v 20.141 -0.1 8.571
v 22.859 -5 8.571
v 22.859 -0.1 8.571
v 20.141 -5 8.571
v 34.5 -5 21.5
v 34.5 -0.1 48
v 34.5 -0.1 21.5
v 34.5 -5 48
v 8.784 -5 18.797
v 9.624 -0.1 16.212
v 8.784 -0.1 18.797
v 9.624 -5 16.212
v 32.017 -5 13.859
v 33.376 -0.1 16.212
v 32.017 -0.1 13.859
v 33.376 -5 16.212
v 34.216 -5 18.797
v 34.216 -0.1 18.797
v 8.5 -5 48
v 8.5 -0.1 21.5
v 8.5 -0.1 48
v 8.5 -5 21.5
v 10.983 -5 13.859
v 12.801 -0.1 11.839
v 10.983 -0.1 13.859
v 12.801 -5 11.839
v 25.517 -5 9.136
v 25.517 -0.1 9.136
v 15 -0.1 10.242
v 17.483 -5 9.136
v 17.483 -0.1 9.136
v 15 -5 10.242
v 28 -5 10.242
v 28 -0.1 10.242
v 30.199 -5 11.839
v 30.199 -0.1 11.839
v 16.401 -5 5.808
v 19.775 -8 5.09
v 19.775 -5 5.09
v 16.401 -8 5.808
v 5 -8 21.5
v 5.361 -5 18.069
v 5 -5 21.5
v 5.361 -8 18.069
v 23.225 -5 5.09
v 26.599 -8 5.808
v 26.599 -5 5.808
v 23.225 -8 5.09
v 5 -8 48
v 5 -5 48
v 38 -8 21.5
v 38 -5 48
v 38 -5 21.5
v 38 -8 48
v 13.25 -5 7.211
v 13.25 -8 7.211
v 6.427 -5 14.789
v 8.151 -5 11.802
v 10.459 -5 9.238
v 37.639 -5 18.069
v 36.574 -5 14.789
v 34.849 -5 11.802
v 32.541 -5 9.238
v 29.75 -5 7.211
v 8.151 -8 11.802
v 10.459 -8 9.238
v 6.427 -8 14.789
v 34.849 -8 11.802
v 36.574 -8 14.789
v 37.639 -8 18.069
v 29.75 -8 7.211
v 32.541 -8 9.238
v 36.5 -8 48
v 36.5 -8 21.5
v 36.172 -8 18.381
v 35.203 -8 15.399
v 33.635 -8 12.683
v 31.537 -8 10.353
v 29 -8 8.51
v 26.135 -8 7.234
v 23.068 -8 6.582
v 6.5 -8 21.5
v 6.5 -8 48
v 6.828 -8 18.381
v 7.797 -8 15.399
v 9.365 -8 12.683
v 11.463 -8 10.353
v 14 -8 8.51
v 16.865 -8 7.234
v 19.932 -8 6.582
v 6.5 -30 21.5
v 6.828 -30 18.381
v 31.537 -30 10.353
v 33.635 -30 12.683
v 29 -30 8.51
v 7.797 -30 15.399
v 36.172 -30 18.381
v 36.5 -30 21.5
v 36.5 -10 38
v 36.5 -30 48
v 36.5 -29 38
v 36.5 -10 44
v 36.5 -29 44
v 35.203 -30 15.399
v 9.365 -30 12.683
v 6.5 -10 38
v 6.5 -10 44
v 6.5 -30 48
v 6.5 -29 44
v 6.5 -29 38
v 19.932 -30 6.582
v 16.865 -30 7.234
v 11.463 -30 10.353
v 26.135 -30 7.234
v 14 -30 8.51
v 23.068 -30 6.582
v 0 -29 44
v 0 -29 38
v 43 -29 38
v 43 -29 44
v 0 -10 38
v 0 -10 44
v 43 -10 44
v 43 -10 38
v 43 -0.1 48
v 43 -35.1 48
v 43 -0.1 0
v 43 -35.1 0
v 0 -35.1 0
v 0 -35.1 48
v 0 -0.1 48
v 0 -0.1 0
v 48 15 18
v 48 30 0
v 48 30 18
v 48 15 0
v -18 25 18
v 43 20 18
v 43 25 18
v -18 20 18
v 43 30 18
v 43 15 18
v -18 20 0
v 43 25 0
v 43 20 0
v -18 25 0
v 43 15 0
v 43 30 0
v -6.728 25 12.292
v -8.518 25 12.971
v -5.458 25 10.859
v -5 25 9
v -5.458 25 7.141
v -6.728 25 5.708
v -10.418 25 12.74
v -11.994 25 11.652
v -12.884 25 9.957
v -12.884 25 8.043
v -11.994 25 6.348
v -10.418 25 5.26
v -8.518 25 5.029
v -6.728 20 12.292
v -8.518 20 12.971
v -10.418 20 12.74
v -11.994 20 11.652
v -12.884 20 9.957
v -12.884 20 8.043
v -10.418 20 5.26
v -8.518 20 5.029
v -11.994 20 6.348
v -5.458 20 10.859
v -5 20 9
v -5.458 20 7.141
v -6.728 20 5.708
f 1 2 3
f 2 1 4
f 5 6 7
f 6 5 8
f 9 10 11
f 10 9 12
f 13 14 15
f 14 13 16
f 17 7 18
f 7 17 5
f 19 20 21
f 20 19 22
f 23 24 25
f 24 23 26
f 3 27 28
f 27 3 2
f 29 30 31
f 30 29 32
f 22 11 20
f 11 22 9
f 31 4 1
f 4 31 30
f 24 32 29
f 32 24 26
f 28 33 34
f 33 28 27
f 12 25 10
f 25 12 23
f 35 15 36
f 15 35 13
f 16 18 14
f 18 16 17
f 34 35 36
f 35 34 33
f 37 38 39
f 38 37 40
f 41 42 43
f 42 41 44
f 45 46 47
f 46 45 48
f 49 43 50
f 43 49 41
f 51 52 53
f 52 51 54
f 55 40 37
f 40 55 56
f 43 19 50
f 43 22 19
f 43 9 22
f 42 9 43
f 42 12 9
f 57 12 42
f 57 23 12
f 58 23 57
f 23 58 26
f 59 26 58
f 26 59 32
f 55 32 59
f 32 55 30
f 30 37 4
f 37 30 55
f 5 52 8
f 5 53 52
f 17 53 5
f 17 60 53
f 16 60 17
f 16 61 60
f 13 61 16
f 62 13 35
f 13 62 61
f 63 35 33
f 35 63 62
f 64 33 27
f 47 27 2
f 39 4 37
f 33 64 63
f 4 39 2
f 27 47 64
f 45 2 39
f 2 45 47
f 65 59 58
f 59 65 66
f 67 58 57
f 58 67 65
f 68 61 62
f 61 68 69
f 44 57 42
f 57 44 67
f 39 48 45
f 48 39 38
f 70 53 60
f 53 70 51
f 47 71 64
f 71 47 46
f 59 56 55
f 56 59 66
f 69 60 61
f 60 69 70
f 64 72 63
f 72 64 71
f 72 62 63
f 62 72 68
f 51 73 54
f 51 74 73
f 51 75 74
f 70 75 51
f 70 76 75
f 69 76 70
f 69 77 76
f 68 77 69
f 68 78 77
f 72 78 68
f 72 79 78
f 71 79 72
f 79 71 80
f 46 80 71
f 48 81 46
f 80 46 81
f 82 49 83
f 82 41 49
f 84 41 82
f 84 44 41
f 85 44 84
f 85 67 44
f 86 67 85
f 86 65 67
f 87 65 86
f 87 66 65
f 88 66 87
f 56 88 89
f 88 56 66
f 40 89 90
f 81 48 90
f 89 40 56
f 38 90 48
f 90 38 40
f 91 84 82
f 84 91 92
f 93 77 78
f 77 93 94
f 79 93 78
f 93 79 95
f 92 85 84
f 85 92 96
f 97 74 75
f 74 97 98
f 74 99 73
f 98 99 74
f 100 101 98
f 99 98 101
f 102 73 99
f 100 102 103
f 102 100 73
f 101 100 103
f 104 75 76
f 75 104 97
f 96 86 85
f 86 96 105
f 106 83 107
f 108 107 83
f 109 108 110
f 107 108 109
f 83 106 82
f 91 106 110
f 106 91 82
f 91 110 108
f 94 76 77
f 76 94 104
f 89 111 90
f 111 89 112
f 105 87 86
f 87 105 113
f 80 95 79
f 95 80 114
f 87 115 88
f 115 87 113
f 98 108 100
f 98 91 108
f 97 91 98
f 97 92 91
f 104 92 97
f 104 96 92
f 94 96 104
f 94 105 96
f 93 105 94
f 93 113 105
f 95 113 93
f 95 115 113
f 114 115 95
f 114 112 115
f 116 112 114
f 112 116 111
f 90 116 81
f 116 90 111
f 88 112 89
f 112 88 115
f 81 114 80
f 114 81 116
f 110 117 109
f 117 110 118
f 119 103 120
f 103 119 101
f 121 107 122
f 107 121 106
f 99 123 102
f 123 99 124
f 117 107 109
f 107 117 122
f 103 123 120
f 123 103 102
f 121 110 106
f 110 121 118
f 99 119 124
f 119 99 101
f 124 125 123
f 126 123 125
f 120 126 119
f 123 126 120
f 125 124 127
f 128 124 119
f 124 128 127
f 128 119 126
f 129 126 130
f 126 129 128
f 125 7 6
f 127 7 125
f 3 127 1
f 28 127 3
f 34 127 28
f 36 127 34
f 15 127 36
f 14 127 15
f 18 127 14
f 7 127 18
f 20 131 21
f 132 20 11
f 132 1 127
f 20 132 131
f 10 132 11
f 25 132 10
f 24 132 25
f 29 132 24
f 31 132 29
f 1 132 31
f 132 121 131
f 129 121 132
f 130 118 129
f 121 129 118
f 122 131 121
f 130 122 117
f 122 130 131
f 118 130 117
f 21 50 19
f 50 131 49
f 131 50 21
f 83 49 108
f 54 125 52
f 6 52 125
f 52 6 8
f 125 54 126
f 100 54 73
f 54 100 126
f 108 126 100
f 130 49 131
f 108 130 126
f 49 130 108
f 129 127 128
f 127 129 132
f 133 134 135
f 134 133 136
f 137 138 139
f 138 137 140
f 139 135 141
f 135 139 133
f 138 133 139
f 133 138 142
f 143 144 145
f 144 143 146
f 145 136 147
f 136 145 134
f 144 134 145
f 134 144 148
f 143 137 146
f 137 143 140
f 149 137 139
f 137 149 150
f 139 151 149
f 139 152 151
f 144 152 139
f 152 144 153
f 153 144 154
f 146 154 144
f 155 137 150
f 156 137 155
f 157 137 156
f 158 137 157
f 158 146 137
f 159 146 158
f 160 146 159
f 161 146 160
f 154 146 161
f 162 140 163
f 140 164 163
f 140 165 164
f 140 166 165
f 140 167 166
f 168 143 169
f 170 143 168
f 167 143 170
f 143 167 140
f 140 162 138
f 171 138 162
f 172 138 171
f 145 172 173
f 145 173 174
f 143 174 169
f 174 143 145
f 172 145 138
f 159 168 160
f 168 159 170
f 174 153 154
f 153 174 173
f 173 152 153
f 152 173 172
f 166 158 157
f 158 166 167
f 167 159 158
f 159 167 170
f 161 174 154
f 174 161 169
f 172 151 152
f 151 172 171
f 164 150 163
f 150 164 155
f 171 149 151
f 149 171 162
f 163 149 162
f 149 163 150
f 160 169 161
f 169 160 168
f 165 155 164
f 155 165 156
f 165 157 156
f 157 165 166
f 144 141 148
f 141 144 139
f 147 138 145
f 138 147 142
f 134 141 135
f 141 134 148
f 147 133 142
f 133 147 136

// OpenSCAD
/* [Bottle] */
// (1) Diameter of the bottleneck
bottleneck=26;

// (2) diameter of the ring around the bottles neck
collarDia=33;

// (3) height of the ring around the bottles neck
collarHeight=3;

// (4) Diameter of the bottle cap
bottleCapDia=30;

// (5) Height of the bottle cap
bottleCapHeight=22;

/* [lock related] */
// hole size for the lock
lockhole=8;

// wall thickness
wall=5;

/* [Hidden] */
// to avoid flickering, add a little overlap
overlap=.1;

module bottle(wide=0) {
    translate([wall+collarDia/2,wall+collarDia/2,0]) union() {
        hull() {
            cylinder(wall+overlap,bottleneck/2,bottleneck/2);
            translate([0,collarDia*wide,0]) cylinder(wall+overlap,bottleneck/2,bottleneck/2);
        }
        hull() {
            translate([0,0,wall]) cylinder(collarHeight,collarDia/2,collarDia/2);
            translate([0,collarDia*wide,wall]) cylinder(collarHeight,collarDia/2,collarDia/2);
        }
        hull() {
            translate([0,0,collarHeight+wall-overlap]) cylinder(bottleCapHeight+overlap,bottleCapDia/2,bottleCapDia/2);
            translate([0,collarDia*wide,collarHeight+wall-overlap]) cylinder(bottleCapHeight+overlap,bottleCapDia/2,bottleCapDia/2);
        }
    }
}


module bolt(cutout=0) {
    difference() {
        translate([-wall-lockhole-wall,0,0]) cube([wall+collarDia+wall*2+wall+lockhole+wall,wall+cutout,wall+lockhole+wall+cutout]);
        translate([-wall-lockhole/2,-overlap,wall+lockhole/2]) rotate([-90,0,0]) cylinder(wall+overlap*2,lockhole/2,lockhole/2);
    }
    translate([wall+collarDia+wall,-wall,0]) cube([wall,wall*3,wall+lockhole+wall]);
}
module lock() {
    difference() {
        translate([0,0,overlap]) cube([collarDia+wall*2,collarDia+wall*3,wall+collarHeight+bottleCapHeight+wall]);
        bottle(wide=1);
        translate([overlap,wall+collarDia,wall+collarHeight+2]) #bolt(cutout=1);
    }
    //#bottle(wide=0);
}
rotate([90,0,0]) lock();
translate([0,20,0]) bolt();
//bottle();
